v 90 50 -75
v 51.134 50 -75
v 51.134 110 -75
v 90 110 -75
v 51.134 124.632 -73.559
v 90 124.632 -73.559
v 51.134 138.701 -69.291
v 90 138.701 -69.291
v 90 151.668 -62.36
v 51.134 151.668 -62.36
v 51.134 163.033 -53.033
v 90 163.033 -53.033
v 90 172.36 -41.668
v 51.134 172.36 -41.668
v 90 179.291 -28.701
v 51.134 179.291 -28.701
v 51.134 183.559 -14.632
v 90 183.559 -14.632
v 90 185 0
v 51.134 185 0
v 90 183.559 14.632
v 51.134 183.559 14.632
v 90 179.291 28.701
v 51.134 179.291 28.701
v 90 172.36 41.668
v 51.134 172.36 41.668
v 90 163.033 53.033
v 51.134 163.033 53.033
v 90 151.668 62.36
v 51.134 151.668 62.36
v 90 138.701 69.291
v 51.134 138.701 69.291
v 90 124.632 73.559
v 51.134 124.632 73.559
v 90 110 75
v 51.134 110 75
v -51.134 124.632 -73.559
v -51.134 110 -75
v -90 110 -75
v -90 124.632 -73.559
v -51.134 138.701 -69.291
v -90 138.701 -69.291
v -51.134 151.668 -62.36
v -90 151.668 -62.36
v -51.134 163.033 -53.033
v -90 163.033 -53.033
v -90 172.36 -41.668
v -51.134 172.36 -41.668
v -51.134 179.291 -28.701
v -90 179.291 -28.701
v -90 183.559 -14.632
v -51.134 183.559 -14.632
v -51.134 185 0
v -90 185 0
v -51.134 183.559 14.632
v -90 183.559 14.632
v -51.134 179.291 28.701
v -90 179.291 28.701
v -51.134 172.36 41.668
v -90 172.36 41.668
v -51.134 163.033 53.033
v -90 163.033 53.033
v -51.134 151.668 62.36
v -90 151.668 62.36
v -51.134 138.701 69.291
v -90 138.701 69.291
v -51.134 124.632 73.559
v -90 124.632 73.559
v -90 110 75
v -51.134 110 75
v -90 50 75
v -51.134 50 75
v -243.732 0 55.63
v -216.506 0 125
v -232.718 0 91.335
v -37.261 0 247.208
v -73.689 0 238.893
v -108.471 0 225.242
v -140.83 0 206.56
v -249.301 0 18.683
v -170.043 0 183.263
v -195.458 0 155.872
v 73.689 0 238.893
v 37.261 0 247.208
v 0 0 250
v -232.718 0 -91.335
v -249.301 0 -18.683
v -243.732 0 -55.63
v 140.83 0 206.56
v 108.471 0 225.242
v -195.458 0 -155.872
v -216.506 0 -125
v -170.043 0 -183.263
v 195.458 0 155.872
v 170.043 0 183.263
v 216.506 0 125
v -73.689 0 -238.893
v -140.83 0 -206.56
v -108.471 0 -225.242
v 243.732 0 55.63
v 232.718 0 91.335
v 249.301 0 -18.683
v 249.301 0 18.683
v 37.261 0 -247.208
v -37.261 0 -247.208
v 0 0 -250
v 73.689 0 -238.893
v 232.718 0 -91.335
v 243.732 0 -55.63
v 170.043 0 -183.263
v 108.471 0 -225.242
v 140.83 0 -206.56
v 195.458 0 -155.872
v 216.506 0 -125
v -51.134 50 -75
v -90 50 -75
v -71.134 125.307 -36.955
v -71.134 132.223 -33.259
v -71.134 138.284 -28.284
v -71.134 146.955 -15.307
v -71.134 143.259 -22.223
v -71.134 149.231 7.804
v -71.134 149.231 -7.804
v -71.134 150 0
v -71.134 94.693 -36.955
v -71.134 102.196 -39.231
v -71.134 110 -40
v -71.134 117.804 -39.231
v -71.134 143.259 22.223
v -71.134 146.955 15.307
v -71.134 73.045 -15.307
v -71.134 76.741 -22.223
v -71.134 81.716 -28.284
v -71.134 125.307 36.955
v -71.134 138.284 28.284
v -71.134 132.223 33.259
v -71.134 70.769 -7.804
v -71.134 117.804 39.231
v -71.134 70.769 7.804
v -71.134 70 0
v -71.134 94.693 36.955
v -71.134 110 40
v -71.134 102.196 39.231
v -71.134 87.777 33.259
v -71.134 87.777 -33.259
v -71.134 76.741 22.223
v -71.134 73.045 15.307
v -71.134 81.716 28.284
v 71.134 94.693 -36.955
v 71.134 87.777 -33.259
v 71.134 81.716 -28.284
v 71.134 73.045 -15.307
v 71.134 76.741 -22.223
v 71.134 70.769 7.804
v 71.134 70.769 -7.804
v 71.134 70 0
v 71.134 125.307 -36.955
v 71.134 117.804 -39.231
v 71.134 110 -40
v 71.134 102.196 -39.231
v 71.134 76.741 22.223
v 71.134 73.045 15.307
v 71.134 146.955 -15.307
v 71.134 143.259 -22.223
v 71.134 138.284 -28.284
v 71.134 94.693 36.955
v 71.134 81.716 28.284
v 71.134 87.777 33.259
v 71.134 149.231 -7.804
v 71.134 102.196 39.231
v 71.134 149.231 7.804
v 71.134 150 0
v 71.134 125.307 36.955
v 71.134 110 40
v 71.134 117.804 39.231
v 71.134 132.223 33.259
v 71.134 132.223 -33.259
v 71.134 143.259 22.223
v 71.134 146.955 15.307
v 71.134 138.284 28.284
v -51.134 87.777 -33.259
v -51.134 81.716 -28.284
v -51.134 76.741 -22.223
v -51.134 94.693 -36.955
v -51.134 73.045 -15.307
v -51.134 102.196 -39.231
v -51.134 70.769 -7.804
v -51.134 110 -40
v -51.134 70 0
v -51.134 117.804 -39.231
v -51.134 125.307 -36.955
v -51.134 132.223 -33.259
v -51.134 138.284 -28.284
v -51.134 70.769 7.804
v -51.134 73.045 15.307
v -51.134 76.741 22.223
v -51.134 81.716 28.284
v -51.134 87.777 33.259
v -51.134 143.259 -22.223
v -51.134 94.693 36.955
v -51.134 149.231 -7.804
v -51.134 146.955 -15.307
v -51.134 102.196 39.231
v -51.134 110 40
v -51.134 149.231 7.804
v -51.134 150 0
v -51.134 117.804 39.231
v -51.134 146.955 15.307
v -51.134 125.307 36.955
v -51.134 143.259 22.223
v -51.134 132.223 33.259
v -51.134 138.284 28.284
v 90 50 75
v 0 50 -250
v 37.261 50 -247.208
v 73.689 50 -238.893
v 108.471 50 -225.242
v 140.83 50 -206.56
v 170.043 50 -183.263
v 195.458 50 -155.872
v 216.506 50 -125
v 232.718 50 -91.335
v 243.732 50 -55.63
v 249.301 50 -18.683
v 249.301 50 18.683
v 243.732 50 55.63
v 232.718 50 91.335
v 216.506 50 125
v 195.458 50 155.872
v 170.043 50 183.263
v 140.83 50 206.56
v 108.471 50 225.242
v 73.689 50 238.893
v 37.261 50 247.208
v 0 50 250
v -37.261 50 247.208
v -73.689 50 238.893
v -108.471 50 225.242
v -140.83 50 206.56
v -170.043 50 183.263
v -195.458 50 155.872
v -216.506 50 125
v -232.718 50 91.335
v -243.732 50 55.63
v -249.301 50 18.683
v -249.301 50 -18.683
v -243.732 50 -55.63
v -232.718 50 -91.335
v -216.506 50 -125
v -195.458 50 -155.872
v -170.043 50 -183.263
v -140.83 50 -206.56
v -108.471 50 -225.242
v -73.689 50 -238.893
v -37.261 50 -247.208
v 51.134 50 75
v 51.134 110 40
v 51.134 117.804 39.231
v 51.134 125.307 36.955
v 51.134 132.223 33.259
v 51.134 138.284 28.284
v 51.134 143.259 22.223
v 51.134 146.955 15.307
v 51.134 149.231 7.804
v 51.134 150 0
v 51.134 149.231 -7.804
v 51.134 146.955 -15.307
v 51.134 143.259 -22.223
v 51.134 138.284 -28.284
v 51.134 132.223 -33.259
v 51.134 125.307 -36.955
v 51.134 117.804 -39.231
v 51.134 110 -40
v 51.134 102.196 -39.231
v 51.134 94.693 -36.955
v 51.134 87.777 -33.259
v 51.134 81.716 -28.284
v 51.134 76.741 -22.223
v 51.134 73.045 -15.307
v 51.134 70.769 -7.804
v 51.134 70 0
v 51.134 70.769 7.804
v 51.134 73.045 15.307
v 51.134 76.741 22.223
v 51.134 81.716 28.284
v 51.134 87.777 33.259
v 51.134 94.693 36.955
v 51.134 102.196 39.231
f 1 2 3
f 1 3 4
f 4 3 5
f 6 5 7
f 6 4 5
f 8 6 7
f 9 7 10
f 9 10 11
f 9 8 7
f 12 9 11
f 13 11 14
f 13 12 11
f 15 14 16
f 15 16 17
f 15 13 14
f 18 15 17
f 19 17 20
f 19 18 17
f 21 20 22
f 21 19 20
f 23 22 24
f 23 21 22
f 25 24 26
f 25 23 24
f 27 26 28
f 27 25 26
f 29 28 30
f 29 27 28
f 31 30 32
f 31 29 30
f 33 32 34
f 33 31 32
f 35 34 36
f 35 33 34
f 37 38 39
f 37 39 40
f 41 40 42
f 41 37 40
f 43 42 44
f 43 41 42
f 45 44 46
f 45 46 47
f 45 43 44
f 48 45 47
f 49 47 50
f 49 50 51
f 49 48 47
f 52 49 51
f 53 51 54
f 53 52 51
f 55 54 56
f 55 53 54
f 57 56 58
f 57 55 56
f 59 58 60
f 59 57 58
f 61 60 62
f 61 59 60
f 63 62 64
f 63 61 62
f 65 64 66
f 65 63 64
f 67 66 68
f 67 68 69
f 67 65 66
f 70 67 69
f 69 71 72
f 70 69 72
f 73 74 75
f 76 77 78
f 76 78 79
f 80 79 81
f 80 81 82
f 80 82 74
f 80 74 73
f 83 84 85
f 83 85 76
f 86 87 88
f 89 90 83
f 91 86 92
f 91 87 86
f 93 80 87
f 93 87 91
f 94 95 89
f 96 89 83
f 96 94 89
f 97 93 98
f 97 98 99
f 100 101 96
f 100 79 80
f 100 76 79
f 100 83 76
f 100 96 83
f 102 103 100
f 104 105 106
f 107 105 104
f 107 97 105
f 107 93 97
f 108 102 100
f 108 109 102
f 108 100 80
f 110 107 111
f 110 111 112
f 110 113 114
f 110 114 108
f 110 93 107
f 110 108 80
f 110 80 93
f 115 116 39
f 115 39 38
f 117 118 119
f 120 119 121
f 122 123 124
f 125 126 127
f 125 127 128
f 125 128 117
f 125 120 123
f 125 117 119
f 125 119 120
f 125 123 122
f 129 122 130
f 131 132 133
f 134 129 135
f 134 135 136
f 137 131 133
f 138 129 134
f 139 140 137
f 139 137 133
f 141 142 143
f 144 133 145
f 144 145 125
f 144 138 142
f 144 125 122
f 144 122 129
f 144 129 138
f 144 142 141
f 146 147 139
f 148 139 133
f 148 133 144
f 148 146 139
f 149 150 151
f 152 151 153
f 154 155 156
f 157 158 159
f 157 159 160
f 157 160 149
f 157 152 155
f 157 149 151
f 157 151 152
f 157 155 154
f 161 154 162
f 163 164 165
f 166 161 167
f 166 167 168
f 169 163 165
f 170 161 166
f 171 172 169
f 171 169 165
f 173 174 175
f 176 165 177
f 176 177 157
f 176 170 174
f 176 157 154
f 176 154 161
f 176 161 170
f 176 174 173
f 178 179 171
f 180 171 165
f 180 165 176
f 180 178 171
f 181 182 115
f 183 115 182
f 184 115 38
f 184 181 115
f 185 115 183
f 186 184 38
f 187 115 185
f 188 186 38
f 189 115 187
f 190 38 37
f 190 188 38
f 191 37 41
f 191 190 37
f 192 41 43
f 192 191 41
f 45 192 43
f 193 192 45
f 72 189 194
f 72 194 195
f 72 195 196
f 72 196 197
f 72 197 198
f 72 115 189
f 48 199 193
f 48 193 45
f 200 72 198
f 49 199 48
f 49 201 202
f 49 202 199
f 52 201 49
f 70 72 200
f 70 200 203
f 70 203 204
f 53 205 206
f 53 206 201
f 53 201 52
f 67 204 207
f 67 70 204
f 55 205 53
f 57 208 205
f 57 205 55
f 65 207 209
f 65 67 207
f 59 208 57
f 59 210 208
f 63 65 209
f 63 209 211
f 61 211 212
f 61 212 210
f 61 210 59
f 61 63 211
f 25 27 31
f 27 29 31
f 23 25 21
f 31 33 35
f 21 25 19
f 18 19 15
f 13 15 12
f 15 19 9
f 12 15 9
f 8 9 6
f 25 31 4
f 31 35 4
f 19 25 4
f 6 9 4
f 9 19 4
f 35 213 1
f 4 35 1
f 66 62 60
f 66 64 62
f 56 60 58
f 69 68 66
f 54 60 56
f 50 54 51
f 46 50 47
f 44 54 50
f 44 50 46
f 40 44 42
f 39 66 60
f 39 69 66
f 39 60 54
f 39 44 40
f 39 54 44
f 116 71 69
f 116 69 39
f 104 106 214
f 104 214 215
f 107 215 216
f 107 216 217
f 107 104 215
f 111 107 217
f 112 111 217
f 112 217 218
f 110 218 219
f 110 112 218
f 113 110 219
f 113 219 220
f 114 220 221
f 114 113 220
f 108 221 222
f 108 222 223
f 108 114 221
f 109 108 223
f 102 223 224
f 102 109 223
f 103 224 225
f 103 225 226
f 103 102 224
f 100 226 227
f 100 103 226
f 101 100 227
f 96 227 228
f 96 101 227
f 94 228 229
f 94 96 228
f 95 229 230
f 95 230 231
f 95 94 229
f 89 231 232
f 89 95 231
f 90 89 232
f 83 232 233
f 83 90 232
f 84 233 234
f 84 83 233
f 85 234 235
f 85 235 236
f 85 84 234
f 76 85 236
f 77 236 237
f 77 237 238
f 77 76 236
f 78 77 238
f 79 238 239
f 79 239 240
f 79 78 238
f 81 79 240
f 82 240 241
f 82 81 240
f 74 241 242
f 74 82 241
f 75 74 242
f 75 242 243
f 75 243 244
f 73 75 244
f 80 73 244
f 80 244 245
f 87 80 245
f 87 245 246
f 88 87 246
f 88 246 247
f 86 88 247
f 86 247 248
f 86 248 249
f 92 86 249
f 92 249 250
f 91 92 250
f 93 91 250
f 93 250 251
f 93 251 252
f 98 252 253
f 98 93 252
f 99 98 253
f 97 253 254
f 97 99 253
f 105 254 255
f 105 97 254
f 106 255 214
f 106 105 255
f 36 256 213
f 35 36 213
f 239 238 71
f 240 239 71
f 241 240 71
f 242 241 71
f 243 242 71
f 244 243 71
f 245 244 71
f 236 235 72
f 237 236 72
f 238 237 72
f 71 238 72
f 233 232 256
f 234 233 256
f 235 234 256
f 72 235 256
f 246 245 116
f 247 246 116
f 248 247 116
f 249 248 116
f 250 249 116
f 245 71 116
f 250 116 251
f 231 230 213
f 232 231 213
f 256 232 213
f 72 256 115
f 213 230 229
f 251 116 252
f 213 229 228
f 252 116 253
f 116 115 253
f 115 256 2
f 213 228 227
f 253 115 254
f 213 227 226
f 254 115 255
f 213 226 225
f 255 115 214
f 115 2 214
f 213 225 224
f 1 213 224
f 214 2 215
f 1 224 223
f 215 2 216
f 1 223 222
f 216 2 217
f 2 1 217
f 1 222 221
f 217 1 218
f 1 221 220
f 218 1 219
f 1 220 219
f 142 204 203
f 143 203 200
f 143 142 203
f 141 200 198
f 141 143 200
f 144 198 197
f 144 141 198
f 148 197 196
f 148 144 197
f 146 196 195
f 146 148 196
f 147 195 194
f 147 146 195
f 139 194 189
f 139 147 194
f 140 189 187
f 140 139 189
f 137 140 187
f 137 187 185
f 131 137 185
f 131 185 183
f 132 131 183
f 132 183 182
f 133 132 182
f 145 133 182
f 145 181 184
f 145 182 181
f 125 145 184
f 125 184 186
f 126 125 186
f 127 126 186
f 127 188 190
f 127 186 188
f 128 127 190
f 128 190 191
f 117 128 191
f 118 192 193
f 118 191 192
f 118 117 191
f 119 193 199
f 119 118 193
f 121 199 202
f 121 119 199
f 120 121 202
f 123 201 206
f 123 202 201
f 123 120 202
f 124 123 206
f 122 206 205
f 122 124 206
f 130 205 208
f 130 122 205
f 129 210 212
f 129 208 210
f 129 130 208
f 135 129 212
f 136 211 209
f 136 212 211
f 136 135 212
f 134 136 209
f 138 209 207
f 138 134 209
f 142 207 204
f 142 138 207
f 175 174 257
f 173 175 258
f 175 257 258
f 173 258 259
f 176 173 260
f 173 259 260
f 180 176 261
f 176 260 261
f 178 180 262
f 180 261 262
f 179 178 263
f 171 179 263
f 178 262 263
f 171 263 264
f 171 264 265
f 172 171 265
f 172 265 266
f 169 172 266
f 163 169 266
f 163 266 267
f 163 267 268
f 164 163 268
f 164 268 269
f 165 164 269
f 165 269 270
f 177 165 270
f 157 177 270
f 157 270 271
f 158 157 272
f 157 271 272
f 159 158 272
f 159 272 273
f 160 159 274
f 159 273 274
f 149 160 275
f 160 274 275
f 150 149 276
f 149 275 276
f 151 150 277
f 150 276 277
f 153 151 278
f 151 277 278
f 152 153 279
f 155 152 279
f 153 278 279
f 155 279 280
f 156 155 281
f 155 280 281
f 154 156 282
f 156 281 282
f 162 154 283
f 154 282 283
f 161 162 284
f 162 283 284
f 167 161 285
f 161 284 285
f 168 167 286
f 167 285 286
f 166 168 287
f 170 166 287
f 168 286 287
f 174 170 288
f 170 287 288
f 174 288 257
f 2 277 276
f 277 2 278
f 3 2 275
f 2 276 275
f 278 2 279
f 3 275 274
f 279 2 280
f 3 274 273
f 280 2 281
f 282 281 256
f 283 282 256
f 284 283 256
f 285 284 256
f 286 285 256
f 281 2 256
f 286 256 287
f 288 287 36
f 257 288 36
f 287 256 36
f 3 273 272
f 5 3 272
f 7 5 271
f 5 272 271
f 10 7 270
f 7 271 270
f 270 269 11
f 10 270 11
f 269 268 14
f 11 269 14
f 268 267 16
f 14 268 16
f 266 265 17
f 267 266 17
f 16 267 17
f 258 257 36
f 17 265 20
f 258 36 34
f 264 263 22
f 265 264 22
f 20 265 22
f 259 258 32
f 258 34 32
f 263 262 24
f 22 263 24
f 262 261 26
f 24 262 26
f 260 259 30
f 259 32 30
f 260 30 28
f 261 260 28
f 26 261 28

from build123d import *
from OCP.BRepAlgoAPI import BRepAlgoAPI_Cut
from OCP.TopTools import TopTools_ListOfShape

# Parameters (mm, degrees)
SKETCH1_R           = 150
BOSS_EXTRUDE1_DEPTH = 50
SKETCH2_W           = 180
SKETCH2_H           = 150
BOSS_EXTRUDE2_DEPTH = 120
SKETCH4_W           = 150
SKETCH4_H           = 60
CUT_EXTRUDE1_DEPTH  = 180
BOSS_EXTRUDE3_DEPTH = 180
SKETCH5_W           = 102.267162736
SKETCH5_H           = 75
CUT_EXTRUDE3_DEPTH  = 180
CUT_EXTRUDE4_START  = 100
CUT_EXTRUDE4_DEPTH  = 100
CUT_EXTRUDE5_START  = -2.26716
CUT_EXTRUDE5_DEPTH  = 2.26716
SKETCH12_R          = 40
CUT_EXTRUDE6_DEPTH  = 20
CUT_EXTRUDE7_START  = -20
SKETCH11_R          = 40
CUT_EXTRUDE7_DEPTH  = 20
SKETCH15_W          = 102.26716
SKETCH15_H          = 60
CUT_EXTRUDE8_DEPTH  = 408
SKETCH16_R          = 250
BOSS_EXTRUDE4_DEPTH = 50


with BuildPart() as part:
    # Sketch1 → Boss-Extrude1 (new body)
    with BuildSketch(Plane(origin=(0, 0, 0), x_dir=(1, 0, 0), z_dir=(0, 1, 0))):
        Circle(SKETCH1_R)
    extrude(amount=BOSS_EXTRUDE1_DEPTH)

    # Sketch2 → Boss-Extrude2 (add)
    with BuildSketch(Plane(origin=(0, 50, 0), x_dir=(1, 0, 0), z_dir=(0, 1, 0))):
        Rectangle(SKETCH2_W, SKETCH2_H)
    extrude(amount=BOSS_EXTRUDE2_DEPTH)

    # Sketch4 → Cut-Extrude1 (cut)
    with BuildSketch(Plane.ZY.offset(90)):
        with Locations((0, 140)):
            Rectangle(SKETCH4_W, SKETCH4_H)
    extrude(amount=-CUT_EXTRUDE1_DEPTH, mode=Mode.SUBTRACT)

    # Sketch3 → Boss-Extrude3 (add)
    with BuildSketch(Plane(origin=(90, 0, 0), x_dir=(0, 0, -1), z_dir=(1, 0, 0))):
        with BuildLine():
            Line((-75, 110), (-75, 50))
            Line((-75, 50), (75, 50))
            Line((75, 50), (75, 110))
            ThreePointArc((75, 110), (0, 185), (-75, 110))
        make_face()
    extrude(amount=-BOSS_EXTRUDE3_DEPTH)

    # Sketch5 → Cut-Extrude3 (cut)
    with BuildSketch(Plane.XY.offset(75)):
        with Locations((0, 147.5)):
            Rectangle(SKETCH5_W, SKETCH5_H)
    extrude(amount=-CUT_EXTRUDE3_DEPTH, mode=Mode.SUBTRACT)

    # Sketch8 → Cut-Extrude4 (cut)
    with BuildSketch(Plane(origin=(-51.133581368, 0, 0), x_dir=(0, 0, -1), z_dir=(1, 0, 0)).offset(CUT_EXTRUDE4_START)):
        with BuildLine():
            Line((-75, 110), (75, 110))
            ThreePointArc((75, 110), (0, 35), (-75, 110))
        make_face()
    extrude(amount=-CUT_EXTRUDE4_DEPTH, mode=Mode.SUBTRACT)

    # Sketch10 → Cut-Extrude5 (cut)
    with BuildSketch(Plane.ZY.offset(-48.866418632).offset(CUT_EXTRUDE5_START)):
        with BuildLine():
            Line((-75, 110), (75, 110))
            ThreePointArc((75, 110), (0, 35), (-75, 110))
        make_face()
    extrude(amount=CUT_EXTRUDE5_DEPTH, mode=Mode.SUBTRACT)


with BuildPart() as cut_extrude6_tool:
    # Sketch12 → Cut-Extrude6 (new body)
    with BuildSketch(Plane.ZY.offset(-51.133581368)):
        with Locations((0, 110)):
            Circle(SKETCH12_R)
    extrude(amount=-CUT_EXTRUDE6_DEPTH)


with BuildPart() as part_1:
    add(part.part)

    # Cut-Extrude6: cut by cut_extrude6_tool, with a tolerance
    cut_extrude6_stock = TopTools_ListOfShape()
    cut_extrude6_stock.Append(part_1.part.wrapped)
    cut_extrude6_tools = TopTools_ListOfShape()
    cut_extrude6_tools.Append(cut_extrude6_tool.part.wrapped)
    cut_extrude6_cut = BRepAlgoAPI_Cut()
    cut_extrude6_cut.SetArguments(cut_extrude6_stock)
    cut_extrude6_cut.SetTools(cut_extrude6_tools)
    cut_extrude6_cut.SetFuzzyValue(0.00001)
    cut_extrude6_cut.Build()
    add(Compound.cast(cut_extrude6_cut.Shape()).solids(), mode=Mode.REPLACE)

    # Sketch11 → Cut-Extrude7 (cut)
    with BuildSketch(Plane(origin=(-51.133581368, 0, 0), x_dir=(0, 0, -1), z_dir=(1, 0, 0)).offset(CUT_EXTRUDE7_START)):
        with Locations((0, 110)):
            Circle(SKETCH11_R)
    extrude(amount=CUT_EXTRUDE7_DEPTH, mode=Mode.SUBTRACT)

    # Sketch15 → Cut-Extrude8 (cut)
    with BuildSketch(Plane.XY.offset(75)):
        with Locations((-1.368e-06, 80)):
            Rectangle(SKETCH15_W, SKETCH15_H)
    extrude(amount=-CUT_EXTRUDE8_DEPTH, mode=Mode.SUBTRACT)

    # Sketch16 → Boss-Extrude4 (add)
    with BuildSketch(Plane.XZ):
        Circle(SKETCH16_R)
    extrude(amount=-BOSS_EXTRUDE4_DEPTH)


solid = part_1.part
